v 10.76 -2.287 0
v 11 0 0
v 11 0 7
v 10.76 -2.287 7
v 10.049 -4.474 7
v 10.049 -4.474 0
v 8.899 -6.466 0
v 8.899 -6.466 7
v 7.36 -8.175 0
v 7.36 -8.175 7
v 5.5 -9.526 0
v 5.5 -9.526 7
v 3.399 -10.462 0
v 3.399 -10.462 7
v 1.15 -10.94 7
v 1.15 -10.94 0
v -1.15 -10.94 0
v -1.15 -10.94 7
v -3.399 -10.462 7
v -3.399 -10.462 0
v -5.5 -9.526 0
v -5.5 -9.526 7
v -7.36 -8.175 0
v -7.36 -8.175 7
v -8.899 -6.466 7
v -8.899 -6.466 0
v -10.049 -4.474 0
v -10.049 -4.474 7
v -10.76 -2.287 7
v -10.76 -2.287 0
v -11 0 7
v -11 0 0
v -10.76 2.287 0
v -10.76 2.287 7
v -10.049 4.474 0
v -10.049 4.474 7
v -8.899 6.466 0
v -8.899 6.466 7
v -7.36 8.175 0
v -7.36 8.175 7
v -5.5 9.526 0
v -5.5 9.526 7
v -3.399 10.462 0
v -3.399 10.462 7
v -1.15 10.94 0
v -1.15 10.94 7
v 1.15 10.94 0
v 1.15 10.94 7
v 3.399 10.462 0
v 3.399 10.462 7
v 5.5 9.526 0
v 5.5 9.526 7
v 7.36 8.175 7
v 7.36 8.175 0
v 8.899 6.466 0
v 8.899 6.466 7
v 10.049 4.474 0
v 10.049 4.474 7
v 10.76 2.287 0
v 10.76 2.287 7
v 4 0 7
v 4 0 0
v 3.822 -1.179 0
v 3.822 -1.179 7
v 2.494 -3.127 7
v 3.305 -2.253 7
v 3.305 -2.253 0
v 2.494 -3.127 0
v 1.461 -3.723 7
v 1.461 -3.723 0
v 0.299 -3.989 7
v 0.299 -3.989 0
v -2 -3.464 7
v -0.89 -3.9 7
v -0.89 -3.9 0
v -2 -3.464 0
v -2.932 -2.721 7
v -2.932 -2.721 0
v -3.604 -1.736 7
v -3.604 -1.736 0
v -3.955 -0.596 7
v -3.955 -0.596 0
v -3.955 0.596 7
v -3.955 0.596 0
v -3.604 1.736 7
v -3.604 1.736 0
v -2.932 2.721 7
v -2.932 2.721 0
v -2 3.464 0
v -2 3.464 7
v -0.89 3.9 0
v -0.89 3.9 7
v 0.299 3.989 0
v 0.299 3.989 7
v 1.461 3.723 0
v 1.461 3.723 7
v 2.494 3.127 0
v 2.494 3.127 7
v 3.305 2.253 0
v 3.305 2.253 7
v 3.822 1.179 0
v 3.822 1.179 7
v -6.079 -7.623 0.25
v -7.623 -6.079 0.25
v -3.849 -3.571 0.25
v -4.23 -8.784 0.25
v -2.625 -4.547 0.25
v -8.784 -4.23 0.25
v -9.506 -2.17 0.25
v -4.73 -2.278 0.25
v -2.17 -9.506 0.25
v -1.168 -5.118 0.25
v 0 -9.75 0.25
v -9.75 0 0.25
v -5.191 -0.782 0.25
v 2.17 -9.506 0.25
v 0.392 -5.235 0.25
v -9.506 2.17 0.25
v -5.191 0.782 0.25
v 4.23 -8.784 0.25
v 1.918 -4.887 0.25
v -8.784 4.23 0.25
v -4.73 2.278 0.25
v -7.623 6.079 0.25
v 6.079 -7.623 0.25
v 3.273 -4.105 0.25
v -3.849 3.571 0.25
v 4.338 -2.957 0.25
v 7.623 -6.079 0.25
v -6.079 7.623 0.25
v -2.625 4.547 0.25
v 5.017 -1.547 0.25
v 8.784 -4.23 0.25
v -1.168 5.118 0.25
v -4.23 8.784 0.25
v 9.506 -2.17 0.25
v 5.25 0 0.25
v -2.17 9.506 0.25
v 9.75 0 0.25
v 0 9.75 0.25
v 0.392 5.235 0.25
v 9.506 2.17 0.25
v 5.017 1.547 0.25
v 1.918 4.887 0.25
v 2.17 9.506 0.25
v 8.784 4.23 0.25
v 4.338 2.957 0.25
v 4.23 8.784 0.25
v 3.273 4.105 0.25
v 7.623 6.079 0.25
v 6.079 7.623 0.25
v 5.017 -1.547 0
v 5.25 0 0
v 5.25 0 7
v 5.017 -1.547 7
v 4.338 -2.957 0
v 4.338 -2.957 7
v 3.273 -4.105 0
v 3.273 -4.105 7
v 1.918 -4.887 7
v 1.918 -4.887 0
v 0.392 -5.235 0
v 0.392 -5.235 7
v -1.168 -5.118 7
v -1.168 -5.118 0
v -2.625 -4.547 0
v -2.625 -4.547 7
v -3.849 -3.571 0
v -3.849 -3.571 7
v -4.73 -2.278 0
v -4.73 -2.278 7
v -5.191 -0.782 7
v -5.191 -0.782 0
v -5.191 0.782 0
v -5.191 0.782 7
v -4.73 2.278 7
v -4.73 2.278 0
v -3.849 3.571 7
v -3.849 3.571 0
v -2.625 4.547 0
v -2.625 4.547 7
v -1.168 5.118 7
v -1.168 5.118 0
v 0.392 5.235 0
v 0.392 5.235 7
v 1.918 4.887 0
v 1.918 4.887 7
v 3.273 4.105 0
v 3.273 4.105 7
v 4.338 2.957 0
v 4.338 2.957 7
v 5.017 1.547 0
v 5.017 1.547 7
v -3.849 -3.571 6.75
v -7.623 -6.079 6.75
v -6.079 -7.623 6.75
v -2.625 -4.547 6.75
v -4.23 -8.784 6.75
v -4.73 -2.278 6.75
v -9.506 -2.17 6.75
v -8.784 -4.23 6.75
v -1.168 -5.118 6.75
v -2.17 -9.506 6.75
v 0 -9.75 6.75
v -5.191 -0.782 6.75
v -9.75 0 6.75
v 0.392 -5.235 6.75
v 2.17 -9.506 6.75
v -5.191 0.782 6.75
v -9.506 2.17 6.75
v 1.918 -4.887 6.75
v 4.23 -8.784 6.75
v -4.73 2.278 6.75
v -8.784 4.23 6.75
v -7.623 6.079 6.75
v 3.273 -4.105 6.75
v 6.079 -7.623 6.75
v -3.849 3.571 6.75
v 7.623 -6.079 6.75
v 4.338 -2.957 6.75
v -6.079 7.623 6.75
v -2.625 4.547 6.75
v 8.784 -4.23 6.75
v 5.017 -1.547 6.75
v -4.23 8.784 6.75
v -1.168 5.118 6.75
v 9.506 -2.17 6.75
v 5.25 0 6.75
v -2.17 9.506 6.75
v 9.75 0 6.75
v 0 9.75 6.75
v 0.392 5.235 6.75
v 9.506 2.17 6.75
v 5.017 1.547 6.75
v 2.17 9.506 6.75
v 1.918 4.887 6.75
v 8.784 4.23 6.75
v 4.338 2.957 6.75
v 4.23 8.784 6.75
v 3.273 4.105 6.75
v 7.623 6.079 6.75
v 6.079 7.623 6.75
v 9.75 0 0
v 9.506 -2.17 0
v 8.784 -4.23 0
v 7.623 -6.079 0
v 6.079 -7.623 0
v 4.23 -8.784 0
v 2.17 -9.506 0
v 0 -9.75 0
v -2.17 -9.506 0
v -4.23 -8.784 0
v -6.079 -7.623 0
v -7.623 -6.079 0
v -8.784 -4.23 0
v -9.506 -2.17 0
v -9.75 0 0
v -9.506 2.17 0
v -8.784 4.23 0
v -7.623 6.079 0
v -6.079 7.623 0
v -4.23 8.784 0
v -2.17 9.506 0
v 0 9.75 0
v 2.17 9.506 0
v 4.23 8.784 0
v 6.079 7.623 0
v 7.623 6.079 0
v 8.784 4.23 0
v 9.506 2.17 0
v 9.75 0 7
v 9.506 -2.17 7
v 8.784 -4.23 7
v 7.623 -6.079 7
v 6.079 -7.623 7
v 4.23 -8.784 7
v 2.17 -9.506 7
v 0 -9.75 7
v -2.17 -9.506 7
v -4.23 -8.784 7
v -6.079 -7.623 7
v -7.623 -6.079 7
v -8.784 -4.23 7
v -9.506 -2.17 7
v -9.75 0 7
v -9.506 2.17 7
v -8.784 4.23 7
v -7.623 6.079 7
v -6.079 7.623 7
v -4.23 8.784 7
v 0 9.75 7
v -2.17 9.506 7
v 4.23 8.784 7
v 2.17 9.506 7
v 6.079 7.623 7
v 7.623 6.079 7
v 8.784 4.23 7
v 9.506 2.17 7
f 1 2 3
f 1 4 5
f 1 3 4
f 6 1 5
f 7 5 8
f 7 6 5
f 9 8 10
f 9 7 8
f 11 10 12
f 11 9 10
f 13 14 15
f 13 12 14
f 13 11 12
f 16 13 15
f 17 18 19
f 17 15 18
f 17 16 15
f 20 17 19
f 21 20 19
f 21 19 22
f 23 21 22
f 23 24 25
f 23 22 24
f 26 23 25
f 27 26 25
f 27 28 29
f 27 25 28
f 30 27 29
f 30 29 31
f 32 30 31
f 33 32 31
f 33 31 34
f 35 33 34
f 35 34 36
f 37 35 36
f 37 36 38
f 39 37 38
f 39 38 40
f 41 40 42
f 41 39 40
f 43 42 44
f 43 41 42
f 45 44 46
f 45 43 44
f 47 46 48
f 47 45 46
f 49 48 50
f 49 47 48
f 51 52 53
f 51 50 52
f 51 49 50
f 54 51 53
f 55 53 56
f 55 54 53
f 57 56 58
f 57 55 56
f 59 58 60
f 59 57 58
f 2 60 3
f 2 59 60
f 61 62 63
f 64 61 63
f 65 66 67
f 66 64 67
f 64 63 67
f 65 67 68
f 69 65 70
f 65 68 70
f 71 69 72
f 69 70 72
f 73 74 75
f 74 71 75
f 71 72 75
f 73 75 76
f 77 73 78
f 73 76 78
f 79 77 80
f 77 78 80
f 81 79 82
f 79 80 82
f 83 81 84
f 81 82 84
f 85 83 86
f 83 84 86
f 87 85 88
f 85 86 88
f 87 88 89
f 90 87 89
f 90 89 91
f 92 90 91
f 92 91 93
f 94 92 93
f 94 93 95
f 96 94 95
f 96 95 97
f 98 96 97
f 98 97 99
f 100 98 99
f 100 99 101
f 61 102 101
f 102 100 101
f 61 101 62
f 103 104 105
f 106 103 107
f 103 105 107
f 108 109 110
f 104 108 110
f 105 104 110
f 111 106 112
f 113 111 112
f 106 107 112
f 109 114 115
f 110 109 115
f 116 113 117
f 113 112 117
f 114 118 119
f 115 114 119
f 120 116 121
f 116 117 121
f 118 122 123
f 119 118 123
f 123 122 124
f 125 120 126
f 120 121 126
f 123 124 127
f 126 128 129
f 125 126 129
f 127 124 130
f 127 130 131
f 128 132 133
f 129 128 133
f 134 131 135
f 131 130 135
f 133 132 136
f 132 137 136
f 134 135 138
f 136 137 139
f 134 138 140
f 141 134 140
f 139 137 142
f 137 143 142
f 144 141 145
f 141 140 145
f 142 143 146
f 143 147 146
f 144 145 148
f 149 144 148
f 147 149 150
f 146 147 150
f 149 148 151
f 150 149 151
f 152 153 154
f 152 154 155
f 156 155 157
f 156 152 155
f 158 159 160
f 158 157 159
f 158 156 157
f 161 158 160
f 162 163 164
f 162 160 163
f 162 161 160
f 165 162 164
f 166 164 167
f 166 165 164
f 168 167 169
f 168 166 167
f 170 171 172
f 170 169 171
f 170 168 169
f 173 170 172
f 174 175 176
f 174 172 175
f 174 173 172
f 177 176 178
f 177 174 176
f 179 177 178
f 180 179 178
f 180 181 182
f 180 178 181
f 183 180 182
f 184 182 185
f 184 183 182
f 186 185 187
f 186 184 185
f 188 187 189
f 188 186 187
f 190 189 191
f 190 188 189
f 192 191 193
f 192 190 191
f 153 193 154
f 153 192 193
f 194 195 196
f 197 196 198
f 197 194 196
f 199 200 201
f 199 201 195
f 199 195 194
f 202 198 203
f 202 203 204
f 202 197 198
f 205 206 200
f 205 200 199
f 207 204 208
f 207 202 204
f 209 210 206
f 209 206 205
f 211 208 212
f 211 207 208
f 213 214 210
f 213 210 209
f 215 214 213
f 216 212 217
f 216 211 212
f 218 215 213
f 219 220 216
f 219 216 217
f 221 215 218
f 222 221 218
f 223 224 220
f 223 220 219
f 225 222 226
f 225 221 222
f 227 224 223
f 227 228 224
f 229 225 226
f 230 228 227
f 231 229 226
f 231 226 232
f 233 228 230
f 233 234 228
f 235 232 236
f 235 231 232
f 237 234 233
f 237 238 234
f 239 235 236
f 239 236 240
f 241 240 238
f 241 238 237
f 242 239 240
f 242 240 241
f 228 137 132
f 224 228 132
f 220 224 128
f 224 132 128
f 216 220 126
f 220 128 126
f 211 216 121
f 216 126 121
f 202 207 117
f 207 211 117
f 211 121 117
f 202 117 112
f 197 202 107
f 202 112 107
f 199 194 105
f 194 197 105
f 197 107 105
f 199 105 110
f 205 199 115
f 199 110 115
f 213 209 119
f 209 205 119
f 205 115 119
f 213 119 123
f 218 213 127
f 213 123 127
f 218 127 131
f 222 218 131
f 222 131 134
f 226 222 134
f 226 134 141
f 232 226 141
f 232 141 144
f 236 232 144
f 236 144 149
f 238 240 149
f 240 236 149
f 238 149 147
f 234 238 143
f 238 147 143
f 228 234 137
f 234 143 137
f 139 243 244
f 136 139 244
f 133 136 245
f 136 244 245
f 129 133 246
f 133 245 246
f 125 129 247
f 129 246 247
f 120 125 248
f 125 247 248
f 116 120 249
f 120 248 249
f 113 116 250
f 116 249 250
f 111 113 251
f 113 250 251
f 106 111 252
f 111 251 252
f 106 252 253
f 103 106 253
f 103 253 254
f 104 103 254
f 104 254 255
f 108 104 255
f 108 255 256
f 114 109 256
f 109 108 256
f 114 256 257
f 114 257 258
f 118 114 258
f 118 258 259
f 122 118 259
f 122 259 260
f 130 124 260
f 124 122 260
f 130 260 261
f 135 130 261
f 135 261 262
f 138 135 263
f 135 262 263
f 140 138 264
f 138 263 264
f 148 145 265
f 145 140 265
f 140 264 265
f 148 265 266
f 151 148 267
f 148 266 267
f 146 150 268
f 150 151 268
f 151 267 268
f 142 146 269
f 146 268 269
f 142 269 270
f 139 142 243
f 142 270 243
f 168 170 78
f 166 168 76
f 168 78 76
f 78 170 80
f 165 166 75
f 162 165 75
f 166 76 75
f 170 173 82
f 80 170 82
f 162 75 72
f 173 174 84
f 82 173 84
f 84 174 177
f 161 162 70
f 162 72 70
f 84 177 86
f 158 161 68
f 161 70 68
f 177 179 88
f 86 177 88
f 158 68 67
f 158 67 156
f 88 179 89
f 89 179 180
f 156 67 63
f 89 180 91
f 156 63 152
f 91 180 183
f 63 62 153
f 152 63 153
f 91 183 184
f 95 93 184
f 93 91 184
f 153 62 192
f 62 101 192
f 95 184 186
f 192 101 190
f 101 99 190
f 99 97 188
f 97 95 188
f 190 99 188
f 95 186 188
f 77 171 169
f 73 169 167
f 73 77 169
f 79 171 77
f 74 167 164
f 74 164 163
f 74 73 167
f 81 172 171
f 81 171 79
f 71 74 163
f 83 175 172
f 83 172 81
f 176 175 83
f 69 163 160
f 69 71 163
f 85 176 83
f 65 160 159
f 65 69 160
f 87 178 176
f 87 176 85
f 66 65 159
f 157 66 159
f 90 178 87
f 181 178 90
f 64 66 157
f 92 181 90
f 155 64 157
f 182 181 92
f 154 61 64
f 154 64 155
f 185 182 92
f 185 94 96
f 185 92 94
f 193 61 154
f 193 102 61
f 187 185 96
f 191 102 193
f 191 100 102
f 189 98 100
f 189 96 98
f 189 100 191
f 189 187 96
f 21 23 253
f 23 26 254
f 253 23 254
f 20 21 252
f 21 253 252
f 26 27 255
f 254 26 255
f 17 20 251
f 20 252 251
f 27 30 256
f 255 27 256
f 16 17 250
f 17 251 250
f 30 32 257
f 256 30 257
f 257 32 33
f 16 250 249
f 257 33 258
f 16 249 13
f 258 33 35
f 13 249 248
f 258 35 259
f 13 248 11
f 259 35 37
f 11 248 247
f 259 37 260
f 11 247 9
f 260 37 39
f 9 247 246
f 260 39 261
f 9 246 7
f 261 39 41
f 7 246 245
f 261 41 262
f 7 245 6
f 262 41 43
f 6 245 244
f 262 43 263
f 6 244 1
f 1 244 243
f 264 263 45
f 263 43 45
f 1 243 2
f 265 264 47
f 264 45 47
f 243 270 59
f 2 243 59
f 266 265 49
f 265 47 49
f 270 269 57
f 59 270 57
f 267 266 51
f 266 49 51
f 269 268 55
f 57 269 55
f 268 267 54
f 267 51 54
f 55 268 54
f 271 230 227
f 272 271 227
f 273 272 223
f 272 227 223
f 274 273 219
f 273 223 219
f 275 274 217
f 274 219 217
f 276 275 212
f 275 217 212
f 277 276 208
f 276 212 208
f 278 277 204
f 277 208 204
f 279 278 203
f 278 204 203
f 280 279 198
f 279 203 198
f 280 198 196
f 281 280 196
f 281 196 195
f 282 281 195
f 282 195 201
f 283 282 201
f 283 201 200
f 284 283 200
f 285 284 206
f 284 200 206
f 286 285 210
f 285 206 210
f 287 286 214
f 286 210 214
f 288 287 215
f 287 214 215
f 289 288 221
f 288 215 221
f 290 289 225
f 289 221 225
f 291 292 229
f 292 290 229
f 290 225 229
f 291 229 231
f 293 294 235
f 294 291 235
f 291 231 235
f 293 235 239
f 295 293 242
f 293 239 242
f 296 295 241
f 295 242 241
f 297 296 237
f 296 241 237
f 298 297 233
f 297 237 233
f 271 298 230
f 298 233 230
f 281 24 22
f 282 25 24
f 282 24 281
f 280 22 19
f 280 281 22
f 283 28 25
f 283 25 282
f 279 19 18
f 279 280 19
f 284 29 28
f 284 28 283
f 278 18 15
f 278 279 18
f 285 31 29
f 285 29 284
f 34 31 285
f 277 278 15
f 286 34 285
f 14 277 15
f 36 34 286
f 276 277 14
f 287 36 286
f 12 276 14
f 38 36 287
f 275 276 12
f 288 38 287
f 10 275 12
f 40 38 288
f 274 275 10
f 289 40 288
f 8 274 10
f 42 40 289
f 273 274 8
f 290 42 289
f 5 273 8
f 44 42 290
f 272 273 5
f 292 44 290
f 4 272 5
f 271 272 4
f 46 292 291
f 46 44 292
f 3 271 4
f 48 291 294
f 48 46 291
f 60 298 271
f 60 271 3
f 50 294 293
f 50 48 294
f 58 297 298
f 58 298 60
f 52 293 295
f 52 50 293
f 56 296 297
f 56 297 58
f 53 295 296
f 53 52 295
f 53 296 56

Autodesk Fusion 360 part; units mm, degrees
sketch "Sketch1" plane through (0, 0, 0) normal (0, 0, 1) x (1, 0, 0)
  circle A0 centre (0, 0) radius 11
  circle A1 centre (0, 0) radius 9.75
  circle A2 centre (0, 0) radius 4
  circle A3 centre (0, 0) radius 5.25
  dimension "d1" = 22
  dimension "d2" = 19.5
  dimension "d3" = 8
  dimension "d4" = 10.5
extrude "Extrude1" add sketch "Sketch1" along normal blind 7 contours A0 makes body 1 in component "Outer Ring"
extrude "Extrude2" add sketch "Sketch1" along normal blind 6.5 from surface at 0.25 contours A1 bodies 1 in component "Outer Ring"
extrude "Extrude1'" add sketch "Sketch1" along normal blind 7 separate body contours A3 makes body 2 in component "Inner Ring"
component "Outer Ring" placed x (1, 0, 0) y (0, 1, 0) z (0, 0, 1) at (0, 0, 0)
component "Inner Ring" placed x (1, 0, 0) y (0, 1, 0) z (0, 0, 1) at (0, 0, 0)
